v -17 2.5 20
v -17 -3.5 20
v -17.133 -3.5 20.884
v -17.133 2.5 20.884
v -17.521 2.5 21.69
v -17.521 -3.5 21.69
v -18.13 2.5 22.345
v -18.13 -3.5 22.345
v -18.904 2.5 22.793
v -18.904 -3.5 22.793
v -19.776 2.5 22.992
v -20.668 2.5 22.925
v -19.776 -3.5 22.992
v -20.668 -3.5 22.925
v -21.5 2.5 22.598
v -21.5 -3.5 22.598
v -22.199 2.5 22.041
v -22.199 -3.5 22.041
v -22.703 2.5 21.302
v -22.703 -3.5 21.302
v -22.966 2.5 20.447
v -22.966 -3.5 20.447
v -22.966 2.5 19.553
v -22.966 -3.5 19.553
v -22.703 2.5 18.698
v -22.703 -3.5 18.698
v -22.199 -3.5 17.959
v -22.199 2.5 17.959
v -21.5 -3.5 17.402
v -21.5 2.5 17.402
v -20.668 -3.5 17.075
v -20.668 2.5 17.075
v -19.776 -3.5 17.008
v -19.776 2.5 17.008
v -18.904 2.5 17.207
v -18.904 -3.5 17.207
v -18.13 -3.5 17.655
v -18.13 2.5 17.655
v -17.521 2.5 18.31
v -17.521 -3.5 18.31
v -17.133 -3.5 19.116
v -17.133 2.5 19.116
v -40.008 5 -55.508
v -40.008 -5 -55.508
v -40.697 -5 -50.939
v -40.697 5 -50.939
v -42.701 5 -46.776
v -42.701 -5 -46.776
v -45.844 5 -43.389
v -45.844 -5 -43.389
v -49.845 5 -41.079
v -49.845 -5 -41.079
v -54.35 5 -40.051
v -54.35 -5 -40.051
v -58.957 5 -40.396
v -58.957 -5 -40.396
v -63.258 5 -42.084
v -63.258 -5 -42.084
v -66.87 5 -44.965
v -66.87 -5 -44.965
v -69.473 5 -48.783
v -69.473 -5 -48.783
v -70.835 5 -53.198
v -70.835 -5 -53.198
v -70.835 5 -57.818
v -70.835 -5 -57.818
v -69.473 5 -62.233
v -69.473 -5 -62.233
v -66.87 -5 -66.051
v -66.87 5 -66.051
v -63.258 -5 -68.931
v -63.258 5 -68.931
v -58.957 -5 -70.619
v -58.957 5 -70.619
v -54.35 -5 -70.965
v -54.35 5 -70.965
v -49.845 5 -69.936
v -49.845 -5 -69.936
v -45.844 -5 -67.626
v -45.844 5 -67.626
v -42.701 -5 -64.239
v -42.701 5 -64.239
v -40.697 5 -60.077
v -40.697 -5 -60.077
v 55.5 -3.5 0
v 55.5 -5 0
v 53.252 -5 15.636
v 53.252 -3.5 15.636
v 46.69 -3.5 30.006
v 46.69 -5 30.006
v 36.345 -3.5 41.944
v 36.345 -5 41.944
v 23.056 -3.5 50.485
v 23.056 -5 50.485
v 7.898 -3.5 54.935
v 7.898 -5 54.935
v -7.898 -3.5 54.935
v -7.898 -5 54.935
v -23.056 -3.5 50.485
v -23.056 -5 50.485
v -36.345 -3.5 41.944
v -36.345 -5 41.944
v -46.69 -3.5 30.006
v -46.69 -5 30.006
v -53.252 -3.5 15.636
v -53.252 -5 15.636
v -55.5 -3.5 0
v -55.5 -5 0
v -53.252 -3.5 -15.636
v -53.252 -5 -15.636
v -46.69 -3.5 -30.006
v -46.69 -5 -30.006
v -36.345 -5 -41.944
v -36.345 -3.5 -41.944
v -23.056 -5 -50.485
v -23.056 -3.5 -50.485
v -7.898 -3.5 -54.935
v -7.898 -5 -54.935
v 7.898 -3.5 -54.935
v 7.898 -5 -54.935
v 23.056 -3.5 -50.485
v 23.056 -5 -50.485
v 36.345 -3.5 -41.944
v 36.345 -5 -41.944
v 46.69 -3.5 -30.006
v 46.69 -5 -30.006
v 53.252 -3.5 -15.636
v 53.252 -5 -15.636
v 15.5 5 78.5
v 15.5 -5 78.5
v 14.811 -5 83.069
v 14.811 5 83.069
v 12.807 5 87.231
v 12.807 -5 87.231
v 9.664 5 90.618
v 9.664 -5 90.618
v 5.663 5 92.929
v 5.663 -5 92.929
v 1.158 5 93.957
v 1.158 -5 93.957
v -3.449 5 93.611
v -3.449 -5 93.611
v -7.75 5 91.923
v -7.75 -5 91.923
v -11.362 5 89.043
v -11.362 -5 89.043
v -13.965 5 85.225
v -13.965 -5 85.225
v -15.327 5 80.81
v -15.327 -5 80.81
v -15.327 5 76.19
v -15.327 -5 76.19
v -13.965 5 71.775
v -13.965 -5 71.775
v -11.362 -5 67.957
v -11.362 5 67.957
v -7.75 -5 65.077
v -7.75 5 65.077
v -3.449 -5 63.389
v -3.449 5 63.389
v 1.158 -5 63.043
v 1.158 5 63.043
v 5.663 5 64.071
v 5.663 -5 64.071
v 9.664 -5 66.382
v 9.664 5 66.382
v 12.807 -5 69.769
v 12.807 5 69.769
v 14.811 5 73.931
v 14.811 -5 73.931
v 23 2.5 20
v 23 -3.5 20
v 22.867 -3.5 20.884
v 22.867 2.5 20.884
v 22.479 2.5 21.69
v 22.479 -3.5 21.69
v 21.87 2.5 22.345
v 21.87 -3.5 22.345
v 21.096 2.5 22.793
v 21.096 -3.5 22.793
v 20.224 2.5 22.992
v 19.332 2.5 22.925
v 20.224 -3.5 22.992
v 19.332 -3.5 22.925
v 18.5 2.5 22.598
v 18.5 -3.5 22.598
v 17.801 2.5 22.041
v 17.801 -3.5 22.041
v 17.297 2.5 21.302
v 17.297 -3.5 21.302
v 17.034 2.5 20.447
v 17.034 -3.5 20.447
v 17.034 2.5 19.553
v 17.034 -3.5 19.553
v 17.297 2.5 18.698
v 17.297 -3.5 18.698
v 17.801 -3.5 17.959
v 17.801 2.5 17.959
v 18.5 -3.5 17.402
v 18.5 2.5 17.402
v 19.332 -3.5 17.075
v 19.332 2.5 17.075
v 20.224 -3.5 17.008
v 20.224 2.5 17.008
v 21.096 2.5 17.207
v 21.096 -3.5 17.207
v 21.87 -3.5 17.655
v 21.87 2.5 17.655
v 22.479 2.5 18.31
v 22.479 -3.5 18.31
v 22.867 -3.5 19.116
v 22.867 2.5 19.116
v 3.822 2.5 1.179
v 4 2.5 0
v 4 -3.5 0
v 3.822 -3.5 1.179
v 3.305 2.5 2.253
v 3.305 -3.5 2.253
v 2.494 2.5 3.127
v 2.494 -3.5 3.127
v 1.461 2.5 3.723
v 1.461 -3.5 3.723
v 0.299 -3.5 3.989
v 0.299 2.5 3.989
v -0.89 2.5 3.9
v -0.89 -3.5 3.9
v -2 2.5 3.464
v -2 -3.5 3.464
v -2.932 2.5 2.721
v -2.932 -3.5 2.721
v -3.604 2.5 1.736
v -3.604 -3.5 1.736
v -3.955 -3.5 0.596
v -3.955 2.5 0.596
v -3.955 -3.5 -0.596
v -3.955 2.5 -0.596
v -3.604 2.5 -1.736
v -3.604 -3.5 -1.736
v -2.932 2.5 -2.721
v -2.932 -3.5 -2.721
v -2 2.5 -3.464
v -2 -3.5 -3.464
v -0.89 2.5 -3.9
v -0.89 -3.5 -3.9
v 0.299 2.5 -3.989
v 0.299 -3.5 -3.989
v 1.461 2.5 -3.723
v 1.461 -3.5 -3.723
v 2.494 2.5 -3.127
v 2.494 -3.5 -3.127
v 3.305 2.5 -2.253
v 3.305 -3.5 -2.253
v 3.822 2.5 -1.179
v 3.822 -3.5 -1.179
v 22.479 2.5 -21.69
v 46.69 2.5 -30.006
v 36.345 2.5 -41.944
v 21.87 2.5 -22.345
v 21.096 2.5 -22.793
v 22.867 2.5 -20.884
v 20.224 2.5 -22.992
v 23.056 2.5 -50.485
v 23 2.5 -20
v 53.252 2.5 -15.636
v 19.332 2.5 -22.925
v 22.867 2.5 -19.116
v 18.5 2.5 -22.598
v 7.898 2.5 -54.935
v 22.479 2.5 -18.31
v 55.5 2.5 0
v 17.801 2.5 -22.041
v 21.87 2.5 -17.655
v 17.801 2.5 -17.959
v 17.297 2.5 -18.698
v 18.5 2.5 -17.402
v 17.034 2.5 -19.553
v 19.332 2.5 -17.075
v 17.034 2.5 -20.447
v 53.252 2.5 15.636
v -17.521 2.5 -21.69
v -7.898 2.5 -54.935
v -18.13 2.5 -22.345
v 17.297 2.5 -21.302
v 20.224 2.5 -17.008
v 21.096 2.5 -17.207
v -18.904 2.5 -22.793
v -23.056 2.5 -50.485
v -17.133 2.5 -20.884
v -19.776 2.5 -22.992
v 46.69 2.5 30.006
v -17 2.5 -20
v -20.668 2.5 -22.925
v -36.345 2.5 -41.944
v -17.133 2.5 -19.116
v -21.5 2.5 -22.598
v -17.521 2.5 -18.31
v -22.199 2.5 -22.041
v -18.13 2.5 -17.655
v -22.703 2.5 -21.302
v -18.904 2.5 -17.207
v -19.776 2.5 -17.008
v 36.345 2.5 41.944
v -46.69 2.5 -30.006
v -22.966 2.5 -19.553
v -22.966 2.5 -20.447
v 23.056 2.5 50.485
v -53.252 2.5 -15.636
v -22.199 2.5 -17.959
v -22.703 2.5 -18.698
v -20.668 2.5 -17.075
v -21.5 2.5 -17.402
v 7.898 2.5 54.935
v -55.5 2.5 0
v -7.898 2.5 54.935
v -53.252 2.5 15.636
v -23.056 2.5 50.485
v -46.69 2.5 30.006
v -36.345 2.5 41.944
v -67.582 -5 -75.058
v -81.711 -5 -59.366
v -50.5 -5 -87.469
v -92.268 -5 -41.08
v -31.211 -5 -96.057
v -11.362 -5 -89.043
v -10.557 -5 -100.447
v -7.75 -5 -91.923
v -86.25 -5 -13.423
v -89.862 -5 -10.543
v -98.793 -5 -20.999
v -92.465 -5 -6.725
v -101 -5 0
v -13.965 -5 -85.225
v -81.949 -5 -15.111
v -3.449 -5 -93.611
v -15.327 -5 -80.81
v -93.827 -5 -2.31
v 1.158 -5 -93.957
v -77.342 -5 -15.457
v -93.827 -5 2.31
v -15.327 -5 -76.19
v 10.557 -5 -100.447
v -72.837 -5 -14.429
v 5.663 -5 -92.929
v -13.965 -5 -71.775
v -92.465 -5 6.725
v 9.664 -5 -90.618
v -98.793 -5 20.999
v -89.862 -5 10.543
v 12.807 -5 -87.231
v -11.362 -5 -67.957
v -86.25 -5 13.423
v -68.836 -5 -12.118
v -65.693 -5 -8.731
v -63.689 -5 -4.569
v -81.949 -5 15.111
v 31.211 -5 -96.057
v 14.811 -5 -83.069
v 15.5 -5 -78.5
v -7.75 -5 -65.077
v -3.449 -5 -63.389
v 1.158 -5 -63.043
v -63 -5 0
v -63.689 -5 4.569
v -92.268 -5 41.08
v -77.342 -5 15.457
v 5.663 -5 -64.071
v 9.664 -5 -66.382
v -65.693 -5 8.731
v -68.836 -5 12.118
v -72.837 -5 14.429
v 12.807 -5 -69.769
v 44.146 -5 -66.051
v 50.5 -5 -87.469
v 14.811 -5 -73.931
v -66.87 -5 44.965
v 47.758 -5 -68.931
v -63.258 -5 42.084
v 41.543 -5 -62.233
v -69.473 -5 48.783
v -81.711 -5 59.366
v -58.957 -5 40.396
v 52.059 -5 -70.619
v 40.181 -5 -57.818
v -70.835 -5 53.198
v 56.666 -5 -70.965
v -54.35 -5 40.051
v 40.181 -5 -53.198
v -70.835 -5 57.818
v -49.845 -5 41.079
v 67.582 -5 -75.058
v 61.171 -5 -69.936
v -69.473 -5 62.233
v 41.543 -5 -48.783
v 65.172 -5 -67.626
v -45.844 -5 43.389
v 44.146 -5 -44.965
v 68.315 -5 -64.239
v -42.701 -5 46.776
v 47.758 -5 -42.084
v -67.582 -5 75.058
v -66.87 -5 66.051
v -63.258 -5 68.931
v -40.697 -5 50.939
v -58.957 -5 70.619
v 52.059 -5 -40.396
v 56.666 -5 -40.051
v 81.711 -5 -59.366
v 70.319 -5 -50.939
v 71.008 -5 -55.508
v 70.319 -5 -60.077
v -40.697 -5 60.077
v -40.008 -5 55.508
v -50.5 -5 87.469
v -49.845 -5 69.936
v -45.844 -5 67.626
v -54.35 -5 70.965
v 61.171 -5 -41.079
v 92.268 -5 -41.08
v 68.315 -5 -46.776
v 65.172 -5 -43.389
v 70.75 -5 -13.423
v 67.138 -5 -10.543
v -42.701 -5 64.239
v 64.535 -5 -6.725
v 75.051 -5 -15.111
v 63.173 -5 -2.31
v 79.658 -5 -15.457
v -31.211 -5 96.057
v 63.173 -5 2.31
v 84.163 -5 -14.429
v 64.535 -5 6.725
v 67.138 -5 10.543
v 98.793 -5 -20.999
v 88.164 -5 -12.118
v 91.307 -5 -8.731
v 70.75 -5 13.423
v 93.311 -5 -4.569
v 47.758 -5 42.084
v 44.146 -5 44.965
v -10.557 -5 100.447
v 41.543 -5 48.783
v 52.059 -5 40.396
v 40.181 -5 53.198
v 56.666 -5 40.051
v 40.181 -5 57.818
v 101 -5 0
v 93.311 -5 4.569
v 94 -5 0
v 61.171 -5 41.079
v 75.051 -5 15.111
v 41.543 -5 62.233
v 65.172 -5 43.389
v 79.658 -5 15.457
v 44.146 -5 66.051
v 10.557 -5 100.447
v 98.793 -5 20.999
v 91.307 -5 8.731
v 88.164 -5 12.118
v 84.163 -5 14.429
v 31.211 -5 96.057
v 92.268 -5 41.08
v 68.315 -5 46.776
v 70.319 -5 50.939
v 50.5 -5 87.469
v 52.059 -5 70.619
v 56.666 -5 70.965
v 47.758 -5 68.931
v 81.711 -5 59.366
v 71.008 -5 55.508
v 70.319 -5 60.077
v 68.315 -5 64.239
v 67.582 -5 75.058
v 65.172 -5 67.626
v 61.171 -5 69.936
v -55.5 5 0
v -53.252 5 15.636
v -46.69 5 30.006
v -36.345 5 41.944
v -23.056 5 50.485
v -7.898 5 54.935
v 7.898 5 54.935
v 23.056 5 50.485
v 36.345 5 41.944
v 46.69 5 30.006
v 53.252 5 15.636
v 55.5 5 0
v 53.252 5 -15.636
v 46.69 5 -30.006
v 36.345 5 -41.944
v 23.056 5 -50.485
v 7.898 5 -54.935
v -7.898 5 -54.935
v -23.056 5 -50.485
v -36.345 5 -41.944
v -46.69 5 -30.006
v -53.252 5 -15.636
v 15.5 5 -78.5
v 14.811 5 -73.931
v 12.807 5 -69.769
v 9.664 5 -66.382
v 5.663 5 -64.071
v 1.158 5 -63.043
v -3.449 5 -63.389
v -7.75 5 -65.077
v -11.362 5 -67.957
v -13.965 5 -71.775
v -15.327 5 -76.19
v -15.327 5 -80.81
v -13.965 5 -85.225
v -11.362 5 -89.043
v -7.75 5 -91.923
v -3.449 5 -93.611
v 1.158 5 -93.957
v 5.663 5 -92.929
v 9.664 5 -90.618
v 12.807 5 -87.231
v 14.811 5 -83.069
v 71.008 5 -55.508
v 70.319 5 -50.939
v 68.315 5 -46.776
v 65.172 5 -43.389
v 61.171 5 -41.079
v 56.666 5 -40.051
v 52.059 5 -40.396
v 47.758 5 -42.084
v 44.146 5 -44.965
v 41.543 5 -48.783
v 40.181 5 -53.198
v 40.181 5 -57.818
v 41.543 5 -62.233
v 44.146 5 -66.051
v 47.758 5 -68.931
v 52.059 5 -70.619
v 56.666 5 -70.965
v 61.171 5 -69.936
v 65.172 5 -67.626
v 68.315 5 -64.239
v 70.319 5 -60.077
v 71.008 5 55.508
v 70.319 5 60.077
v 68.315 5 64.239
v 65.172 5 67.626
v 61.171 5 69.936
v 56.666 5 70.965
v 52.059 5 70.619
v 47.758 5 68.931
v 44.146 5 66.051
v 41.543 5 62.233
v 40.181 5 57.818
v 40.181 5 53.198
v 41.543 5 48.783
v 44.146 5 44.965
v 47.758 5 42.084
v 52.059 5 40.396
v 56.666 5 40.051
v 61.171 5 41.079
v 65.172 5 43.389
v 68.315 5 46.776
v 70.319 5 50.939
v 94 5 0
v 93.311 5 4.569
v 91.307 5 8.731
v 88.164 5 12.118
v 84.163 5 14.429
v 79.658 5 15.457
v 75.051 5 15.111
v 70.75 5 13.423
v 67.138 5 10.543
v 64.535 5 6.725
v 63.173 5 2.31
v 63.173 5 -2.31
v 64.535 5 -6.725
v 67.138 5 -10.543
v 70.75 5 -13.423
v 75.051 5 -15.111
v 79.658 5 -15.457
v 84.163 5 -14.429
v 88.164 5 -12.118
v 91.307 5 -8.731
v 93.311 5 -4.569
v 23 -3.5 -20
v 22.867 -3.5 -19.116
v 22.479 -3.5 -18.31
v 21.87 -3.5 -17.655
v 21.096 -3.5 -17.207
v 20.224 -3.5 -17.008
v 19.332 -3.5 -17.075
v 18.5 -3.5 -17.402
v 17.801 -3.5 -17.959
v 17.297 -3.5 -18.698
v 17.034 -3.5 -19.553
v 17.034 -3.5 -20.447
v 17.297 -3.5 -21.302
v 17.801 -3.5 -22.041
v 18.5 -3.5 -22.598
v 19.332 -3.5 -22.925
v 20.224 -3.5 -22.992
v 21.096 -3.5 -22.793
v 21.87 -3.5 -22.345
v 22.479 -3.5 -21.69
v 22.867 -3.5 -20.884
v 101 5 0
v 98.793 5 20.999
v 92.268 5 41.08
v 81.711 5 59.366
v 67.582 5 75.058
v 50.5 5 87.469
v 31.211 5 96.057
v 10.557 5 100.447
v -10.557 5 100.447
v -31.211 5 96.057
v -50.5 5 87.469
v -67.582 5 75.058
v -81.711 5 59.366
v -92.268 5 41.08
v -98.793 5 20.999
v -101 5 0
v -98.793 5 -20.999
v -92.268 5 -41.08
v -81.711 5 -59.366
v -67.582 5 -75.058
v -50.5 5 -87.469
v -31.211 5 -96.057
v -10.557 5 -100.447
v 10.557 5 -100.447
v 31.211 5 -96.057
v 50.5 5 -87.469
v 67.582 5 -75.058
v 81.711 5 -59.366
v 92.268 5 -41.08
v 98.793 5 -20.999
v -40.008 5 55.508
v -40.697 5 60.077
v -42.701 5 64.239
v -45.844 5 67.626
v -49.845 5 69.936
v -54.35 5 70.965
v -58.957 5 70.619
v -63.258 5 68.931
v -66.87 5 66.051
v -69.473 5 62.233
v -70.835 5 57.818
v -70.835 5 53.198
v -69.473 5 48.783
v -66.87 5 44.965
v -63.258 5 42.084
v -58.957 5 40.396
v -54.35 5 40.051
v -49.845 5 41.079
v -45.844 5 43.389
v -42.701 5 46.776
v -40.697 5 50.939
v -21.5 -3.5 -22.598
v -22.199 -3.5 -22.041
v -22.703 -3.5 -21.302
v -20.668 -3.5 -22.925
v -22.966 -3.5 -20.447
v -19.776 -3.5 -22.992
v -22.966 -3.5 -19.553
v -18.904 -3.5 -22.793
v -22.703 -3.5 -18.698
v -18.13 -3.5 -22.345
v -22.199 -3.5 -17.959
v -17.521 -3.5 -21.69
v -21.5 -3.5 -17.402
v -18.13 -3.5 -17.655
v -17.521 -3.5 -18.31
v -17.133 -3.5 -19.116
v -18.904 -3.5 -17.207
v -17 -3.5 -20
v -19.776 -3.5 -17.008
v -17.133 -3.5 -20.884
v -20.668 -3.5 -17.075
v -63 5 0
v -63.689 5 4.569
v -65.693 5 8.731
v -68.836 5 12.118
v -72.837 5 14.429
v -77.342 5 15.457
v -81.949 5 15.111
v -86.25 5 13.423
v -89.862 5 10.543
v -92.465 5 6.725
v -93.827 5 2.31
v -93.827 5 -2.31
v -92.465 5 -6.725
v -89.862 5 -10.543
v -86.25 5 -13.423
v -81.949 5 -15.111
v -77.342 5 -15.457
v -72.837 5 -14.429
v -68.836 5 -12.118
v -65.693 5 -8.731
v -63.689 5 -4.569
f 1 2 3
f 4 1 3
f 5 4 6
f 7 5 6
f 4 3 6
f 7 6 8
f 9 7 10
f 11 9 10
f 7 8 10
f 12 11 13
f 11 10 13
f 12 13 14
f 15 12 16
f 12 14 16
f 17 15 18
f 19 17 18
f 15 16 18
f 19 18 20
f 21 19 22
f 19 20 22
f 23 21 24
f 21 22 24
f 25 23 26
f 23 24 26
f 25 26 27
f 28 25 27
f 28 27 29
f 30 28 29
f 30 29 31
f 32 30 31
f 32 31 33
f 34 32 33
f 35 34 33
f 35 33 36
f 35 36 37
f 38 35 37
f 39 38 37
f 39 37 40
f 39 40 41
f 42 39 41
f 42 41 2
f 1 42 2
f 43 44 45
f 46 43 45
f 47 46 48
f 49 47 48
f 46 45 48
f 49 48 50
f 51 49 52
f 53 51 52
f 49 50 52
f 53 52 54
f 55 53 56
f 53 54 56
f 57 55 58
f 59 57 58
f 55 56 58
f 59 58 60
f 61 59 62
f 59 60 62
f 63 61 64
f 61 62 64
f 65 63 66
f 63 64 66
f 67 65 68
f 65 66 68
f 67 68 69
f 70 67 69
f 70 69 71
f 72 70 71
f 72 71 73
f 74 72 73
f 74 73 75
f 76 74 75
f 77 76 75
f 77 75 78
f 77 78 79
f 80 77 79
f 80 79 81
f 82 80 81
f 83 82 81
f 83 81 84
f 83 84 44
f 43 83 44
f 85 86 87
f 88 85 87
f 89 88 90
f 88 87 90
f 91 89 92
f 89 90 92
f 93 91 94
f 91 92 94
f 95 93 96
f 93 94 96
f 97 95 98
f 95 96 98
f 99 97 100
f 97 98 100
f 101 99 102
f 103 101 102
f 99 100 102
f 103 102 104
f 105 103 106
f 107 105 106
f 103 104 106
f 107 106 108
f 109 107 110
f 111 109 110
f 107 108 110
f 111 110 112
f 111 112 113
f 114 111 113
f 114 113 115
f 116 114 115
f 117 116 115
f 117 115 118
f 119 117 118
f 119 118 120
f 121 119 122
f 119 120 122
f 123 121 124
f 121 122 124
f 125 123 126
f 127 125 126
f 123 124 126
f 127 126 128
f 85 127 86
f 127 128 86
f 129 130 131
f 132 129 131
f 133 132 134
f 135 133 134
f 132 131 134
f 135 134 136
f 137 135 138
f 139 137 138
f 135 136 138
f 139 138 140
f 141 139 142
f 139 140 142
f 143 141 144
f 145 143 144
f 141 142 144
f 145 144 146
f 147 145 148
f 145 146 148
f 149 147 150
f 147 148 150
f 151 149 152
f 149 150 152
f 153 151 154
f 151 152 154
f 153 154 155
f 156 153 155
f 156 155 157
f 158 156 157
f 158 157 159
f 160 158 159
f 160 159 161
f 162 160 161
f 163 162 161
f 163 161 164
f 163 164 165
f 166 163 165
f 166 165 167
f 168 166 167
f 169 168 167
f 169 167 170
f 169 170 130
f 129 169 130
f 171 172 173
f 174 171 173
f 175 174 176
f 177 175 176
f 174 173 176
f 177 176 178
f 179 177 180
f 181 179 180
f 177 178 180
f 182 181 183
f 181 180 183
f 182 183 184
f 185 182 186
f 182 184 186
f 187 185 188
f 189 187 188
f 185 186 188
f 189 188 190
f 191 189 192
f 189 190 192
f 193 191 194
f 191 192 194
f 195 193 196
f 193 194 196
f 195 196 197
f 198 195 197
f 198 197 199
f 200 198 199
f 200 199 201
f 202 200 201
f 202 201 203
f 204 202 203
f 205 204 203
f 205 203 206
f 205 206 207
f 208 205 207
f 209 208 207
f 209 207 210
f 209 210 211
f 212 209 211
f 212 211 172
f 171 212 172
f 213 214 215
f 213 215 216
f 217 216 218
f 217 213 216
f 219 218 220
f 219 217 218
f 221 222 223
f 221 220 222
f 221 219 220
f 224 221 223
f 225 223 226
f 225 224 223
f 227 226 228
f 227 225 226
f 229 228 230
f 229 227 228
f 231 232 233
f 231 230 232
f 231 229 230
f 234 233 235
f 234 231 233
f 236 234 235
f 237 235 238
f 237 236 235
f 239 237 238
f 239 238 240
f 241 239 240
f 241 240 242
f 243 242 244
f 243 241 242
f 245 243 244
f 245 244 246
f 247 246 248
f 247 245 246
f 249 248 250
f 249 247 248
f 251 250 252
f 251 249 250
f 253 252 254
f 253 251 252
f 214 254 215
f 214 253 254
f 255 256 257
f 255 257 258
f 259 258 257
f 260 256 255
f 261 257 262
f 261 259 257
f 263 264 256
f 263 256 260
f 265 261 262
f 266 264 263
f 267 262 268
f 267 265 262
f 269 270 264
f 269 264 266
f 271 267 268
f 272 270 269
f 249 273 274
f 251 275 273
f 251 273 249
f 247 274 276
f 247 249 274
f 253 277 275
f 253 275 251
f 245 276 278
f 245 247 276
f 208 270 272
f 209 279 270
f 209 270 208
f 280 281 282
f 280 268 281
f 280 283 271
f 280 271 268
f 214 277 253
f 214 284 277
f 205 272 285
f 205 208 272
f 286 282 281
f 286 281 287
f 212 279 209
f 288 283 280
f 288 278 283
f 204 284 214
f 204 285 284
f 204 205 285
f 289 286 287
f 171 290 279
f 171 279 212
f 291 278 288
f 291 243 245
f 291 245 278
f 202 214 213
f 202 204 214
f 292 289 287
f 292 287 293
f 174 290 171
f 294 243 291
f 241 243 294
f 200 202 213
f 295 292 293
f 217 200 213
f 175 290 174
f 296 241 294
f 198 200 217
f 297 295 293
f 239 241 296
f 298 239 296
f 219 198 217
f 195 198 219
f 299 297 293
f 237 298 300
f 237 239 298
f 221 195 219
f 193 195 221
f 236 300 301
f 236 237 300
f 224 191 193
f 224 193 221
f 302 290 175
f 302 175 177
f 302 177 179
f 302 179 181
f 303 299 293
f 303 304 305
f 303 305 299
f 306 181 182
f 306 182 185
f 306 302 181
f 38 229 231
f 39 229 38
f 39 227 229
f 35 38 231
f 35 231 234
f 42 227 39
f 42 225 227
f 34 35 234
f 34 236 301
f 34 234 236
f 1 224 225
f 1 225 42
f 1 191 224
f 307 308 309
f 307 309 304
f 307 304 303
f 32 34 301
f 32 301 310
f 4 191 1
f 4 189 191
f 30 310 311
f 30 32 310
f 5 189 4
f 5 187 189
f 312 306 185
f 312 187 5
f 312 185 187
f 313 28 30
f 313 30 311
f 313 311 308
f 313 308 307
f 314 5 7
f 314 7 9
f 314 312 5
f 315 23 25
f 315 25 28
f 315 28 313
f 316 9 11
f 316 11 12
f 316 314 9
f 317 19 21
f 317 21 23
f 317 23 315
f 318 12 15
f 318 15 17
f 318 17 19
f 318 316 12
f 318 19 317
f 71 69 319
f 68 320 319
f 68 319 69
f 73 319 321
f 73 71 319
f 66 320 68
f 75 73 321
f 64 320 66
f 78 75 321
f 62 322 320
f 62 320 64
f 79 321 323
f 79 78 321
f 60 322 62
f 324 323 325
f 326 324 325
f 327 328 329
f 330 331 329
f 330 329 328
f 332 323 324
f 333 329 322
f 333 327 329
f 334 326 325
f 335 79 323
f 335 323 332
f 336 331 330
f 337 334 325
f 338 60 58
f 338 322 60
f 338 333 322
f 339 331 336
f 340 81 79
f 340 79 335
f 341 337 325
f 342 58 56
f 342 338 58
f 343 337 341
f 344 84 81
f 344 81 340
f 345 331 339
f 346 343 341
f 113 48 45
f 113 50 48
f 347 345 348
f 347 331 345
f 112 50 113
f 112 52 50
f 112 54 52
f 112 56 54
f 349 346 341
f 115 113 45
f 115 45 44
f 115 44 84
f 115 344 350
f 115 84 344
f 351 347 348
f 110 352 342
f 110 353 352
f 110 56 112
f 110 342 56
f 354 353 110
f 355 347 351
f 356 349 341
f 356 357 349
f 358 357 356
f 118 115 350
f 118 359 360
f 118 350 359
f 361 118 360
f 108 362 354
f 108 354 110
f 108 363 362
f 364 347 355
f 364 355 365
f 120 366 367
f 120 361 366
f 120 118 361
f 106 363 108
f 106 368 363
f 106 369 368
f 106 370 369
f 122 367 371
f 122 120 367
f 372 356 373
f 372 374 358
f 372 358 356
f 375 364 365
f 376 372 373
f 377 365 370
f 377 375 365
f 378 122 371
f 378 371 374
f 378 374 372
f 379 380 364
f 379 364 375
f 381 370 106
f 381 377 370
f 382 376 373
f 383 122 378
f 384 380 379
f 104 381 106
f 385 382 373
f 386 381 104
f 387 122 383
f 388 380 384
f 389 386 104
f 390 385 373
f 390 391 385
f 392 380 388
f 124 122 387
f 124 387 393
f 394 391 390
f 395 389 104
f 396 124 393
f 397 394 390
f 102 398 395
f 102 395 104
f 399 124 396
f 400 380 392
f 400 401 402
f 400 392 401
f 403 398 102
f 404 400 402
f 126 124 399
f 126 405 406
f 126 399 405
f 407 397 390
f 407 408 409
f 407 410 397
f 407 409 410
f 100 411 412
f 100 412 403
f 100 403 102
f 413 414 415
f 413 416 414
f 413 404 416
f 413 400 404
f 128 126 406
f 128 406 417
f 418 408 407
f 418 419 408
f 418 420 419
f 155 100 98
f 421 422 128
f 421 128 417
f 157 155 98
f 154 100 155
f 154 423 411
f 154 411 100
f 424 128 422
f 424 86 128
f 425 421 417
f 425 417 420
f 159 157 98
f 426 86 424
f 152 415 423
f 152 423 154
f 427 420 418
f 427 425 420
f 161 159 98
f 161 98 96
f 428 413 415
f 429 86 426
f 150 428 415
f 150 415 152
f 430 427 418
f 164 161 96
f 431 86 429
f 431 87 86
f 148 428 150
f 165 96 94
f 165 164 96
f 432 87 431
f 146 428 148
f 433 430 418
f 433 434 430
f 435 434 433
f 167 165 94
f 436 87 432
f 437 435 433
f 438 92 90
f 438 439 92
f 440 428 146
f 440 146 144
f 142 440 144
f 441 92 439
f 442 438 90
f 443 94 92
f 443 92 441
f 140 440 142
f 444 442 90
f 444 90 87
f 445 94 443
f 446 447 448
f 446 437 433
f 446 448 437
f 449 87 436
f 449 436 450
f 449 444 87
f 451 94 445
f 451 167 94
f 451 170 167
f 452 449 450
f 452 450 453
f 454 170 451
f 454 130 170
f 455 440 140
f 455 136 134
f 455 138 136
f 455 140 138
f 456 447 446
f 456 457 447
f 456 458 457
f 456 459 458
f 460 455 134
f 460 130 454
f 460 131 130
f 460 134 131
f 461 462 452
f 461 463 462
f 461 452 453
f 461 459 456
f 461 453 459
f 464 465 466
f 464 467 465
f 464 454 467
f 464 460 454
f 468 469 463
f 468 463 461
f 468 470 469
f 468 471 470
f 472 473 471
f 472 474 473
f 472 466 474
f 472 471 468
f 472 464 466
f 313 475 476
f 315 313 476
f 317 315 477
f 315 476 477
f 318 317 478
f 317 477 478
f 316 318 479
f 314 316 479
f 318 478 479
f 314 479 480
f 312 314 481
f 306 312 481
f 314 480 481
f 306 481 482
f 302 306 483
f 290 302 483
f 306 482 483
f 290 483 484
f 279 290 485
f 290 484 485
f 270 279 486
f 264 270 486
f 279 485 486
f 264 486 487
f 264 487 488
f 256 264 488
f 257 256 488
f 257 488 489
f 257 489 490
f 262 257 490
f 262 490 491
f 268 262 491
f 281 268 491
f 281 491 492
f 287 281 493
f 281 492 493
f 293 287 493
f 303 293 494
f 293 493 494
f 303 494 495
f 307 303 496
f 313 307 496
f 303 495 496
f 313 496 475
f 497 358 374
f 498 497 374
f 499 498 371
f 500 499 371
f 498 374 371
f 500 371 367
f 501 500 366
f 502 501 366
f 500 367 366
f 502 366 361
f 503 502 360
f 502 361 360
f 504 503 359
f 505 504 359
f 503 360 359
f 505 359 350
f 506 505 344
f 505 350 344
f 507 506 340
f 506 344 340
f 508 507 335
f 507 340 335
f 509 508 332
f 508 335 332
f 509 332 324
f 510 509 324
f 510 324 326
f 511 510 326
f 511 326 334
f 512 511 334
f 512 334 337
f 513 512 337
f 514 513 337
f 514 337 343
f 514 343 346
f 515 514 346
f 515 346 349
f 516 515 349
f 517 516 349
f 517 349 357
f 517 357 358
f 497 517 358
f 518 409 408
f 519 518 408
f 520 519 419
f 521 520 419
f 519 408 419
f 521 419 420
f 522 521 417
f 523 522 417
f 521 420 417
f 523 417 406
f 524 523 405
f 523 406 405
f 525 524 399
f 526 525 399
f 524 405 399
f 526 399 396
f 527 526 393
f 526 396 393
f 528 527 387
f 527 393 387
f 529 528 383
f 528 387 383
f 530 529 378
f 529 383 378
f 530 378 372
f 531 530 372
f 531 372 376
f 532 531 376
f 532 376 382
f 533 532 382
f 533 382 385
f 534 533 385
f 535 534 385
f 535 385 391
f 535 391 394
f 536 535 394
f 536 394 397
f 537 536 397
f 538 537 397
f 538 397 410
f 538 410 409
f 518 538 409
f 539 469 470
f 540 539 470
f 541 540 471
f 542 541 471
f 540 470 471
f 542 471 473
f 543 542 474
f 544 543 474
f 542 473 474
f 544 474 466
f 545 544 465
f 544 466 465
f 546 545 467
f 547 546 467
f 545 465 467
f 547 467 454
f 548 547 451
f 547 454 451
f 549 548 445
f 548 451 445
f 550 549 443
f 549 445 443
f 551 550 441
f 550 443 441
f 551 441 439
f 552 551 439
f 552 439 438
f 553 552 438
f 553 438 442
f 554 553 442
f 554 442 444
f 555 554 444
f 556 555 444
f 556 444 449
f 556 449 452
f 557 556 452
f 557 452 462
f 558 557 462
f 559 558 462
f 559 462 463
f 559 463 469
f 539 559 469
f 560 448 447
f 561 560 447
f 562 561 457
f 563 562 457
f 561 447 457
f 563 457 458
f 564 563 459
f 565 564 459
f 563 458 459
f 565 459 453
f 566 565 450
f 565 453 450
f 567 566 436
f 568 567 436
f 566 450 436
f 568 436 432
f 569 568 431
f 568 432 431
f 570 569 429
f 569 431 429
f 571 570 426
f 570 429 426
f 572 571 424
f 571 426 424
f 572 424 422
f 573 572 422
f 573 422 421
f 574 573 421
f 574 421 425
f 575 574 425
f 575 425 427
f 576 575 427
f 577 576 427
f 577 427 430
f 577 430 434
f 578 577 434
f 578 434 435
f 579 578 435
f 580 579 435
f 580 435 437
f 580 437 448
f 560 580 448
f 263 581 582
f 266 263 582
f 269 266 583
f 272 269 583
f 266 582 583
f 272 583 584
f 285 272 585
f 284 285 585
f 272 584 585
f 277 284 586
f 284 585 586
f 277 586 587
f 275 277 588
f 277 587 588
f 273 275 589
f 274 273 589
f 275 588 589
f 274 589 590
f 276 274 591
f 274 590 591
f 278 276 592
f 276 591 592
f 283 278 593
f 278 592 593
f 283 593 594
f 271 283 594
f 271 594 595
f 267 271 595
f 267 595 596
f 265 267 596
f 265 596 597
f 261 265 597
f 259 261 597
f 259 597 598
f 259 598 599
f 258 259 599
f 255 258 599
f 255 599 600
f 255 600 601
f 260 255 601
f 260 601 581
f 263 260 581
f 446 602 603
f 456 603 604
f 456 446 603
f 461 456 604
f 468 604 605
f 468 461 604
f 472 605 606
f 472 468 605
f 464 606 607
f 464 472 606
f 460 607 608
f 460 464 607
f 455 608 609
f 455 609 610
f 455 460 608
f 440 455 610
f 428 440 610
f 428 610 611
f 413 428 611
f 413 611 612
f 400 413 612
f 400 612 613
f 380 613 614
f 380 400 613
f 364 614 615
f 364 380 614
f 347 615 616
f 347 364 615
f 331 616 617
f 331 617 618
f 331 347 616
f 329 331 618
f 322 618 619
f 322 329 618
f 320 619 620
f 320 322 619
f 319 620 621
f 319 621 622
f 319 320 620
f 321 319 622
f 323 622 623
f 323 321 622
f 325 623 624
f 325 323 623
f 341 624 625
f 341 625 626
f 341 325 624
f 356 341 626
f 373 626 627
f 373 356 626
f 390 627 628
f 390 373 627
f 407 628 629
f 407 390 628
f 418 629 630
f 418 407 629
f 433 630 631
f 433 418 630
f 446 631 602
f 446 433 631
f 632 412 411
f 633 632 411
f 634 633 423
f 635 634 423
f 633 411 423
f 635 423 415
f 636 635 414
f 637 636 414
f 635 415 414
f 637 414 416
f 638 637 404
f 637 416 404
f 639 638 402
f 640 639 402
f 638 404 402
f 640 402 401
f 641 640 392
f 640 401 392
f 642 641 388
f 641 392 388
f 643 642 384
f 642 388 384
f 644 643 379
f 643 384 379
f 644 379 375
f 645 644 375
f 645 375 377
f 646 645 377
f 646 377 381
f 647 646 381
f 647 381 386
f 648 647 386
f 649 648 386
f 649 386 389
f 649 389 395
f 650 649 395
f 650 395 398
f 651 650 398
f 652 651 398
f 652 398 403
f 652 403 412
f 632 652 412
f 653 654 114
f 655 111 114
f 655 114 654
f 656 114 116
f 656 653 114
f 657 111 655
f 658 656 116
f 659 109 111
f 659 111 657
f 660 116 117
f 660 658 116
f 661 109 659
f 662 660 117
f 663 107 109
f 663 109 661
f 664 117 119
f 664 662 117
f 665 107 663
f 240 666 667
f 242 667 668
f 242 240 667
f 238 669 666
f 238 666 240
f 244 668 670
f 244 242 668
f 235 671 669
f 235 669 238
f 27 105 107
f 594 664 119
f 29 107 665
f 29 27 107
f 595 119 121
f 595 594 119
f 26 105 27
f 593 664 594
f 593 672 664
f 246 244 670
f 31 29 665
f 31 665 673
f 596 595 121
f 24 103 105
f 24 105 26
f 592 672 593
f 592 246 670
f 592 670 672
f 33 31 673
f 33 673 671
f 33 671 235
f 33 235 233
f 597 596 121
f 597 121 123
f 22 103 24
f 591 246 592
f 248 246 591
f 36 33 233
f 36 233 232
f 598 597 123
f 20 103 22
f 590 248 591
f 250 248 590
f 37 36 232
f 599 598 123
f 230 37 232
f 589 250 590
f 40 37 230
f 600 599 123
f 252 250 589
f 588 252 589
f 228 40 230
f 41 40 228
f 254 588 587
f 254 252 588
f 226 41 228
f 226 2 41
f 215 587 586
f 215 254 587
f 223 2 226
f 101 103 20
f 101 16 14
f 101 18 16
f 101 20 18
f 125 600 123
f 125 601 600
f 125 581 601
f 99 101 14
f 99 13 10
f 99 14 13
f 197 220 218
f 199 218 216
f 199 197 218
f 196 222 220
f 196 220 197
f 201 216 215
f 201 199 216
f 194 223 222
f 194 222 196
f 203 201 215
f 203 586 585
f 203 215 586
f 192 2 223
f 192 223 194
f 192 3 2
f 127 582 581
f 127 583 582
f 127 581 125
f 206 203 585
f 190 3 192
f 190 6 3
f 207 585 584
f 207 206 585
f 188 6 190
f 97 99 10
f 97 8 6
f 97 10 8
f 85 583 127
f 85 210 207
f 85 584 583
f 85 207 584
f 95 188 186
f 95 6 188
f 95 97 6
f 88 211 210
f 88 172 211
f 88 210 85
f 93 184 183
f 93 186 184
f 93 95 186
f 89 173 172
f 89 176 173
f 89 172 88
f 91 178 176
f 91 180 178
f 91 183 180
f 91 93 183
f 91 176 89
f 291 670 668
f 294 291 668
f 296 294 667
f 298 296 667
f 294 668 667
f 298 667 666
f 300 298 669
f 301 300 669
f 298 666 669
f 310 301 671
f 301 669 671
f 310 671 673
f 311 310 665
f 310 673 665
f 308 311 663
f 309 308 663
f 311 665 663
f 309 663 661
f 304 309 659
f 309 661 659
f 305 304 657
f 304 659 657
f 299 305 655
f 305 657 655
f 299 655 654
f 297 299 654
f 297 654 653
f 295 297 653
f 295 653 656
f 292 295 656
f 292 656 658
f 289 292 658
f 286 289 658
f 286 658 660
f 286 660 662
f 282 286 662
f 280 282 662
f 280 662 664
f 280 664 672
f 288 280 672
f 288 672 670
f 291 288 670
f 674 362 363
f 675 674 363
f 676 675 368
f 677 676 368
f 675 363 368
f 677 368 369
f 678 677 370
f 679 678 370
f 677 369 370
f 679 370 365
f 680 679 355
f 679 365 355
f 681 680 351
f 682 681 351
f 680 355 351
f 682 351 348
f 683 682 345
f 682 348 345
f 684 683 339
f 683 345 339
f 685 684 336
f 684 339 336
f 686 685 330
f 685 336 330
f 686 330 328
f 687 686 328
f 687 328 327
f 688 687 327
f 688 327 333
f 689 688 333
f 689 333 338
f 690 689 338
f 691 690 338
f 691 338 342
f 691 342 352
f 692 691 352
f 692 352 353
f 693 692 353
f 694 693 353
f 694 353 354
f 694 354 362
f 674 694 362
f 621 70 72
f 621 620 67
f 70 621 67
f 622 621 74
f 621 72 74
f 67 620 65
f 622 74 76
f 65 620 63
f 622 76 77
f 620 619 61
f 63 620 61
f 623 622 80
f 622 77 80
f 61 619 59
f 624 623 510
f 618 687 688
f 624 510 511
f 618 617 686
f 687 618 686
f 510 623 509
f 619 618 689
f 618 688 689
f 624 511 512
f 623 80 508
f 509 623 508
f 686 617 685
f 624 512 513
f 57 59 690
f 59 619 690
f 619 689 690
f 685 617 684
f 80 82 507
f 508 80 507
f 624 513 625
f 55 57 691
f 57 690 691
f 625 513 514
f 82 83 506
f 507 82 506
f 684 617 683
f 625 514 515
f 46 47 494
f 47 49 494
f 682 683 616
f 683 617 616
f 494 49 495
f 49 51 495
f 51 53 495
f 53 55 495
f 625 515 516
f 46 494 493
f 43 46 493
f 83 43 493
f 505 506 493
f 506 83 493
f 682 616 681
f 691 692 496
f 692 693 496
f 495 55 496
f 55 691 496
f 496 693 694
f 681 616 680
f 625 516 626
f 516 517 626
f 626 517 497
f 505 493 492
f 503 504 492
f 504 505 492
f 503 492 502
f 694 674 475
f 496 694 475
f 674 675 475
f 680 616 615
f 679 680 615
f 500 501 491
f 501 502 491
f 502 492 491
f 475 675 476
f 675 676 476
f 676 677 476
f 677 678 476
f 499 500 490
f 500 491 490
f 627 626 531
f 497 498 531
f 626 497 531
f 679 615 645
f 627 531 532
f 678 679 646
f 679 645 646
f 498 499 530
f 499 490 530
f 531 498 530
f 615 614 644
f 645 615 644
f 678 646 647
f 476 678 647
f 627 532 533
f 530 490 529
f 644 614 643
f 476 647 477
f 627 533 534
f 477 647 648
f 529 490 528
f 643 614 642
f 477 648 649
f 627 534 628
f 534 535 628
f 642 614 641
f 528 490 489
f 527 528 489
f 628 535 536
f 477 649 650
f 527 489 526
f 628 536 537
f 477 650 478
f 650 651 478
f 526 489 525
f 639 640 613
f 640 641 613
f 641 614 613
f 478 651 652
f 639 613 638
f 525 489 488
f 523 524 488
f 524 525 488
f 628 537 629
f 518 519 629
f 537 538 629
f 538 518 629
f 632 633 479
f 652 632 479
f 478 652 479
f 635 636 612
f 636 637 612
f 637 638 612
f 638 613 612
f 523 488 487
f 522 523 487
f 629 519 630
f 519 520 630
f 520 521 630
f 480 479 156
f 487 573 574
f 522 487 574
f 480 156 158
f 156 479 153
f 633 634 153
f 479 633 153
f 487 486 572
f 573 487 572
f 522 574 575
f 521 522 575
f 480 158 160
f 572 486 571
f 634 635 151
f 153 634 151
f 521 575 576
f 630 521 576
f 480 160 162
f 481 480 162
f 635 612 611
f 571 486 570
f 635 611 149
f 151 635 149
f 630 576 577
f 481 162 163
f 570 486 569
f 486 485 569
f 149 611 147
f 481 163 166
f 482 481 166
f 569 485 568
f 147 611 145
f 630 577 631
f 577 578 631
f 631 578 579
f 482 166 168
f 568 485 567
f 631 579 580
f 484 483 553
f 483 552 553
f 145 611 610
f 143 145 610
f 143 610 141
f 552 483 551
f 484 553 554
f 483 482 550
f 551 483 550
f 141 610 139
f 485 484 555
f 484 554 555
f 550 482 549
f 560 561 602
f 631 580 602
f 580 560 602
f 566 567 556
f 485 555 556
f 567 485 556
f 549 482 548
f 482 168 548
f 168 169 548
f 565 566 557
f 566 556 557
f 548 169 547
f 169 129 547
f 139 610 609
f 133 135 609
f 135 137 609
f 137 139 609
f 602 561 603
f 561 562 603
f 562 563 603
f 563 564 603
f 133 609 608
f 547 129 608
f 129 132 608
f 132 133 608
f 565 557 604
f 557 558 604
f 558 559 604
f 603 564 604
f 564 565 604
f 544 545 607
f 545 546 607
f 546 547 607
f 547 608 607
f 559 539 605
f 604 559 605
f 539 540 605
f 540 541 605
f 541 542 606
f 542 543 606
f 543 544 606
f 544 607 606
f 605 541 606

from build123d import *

# Parameters (mm, degrees)
F0_R         = 101
F0_R_2       = 4
F1_DEPTH     = 5
F2_R         = 15.5
F2_R_2       = 3
F1_FACE1_R   = 101
F1_FACE1_R_2 = 4
F3_DEPTH     = 10.001
F5_R         = 55.5
F6_DEPTH     = 1.5
F7_R         = 55.5
F4_DEPTH     = 2.5


with BuildPart() as f1:
    # F0 (on Front) → F1 (new body, symmetric)
    with BuildSketch(Plane.XZ):
        Circle(F0_R)
        Circle(F0_R_2, mode=Mode.SUBTRACT)
    extrude(amount=F1_DEPTH, both=True)

    # F2 (on face) + F1_face1 (on face) → F3 (cut, through all)
    with BuildSketch(Plane.XZ.offset(5)):
        with Locations((-55.5078823231, -55.5078823231)):
            Circle(F2_R)
        with Locations((-78.5, 0)):
            Circle(F2_R)
        with Locations((-55.5078823231, 55.5078823231)):
            Circle(F2_R)
        with Locations((0, 78.5)):
            Circle(F2_R)
        with Locations((55.5078823231, 55.5078823231)):
            Circle(F2_R)
        with Locations((78.5, 0)):
            Circle(F2_R)
        with Locations((55.5078823231, -55.5078823231)):
            Circle(F2_R)
        with Locations((0, -78.5)):
            Circle(F2_R)
        with Locations((-20, 20)):
            Circle(F2_R_2)
        with Locations((20, 20)):
            Circle(F2_R_2)
        with Locations((20, -20)):
            Circle(F2_R_2)
        with Locations((-20, -20)):
            Circle(F2_R_2)
    with BuildSketch(Plane(origin=(0, 5, 0), x_dir=(1, 0, 0), z_dir=(0, 1, 0))):
        Circle(F1_FACE1_R)
        Circle(F1_FACE1_R_2, mode=Mode.SUBTRACT)
    extrude(amount=-F3_DEPTH, dir=(0, -1, 0), mode=Mode.SUBTRACT)

    # F5 (on face) → F6 (cut, symmetric)
    with BuildSketch(Plane.XZ.offset(5)):
        Circle(F5_R)
    extrude(amount=F6_DEPTH, both=True, mode=Mode.SUBTRACT)

    # F7 (on face) → F4 (cut, symmetric)
    with BuildSketch(Plane(origin=(0, 5, 0), x_dir=(-1, 0, 0), z_dir=(0, 1, 0))):
        Circle(F7_R)
    extrude(amount=F4_DEPTH, both=True, mode=Mode.SUBTRACT)


solid = f1.part
